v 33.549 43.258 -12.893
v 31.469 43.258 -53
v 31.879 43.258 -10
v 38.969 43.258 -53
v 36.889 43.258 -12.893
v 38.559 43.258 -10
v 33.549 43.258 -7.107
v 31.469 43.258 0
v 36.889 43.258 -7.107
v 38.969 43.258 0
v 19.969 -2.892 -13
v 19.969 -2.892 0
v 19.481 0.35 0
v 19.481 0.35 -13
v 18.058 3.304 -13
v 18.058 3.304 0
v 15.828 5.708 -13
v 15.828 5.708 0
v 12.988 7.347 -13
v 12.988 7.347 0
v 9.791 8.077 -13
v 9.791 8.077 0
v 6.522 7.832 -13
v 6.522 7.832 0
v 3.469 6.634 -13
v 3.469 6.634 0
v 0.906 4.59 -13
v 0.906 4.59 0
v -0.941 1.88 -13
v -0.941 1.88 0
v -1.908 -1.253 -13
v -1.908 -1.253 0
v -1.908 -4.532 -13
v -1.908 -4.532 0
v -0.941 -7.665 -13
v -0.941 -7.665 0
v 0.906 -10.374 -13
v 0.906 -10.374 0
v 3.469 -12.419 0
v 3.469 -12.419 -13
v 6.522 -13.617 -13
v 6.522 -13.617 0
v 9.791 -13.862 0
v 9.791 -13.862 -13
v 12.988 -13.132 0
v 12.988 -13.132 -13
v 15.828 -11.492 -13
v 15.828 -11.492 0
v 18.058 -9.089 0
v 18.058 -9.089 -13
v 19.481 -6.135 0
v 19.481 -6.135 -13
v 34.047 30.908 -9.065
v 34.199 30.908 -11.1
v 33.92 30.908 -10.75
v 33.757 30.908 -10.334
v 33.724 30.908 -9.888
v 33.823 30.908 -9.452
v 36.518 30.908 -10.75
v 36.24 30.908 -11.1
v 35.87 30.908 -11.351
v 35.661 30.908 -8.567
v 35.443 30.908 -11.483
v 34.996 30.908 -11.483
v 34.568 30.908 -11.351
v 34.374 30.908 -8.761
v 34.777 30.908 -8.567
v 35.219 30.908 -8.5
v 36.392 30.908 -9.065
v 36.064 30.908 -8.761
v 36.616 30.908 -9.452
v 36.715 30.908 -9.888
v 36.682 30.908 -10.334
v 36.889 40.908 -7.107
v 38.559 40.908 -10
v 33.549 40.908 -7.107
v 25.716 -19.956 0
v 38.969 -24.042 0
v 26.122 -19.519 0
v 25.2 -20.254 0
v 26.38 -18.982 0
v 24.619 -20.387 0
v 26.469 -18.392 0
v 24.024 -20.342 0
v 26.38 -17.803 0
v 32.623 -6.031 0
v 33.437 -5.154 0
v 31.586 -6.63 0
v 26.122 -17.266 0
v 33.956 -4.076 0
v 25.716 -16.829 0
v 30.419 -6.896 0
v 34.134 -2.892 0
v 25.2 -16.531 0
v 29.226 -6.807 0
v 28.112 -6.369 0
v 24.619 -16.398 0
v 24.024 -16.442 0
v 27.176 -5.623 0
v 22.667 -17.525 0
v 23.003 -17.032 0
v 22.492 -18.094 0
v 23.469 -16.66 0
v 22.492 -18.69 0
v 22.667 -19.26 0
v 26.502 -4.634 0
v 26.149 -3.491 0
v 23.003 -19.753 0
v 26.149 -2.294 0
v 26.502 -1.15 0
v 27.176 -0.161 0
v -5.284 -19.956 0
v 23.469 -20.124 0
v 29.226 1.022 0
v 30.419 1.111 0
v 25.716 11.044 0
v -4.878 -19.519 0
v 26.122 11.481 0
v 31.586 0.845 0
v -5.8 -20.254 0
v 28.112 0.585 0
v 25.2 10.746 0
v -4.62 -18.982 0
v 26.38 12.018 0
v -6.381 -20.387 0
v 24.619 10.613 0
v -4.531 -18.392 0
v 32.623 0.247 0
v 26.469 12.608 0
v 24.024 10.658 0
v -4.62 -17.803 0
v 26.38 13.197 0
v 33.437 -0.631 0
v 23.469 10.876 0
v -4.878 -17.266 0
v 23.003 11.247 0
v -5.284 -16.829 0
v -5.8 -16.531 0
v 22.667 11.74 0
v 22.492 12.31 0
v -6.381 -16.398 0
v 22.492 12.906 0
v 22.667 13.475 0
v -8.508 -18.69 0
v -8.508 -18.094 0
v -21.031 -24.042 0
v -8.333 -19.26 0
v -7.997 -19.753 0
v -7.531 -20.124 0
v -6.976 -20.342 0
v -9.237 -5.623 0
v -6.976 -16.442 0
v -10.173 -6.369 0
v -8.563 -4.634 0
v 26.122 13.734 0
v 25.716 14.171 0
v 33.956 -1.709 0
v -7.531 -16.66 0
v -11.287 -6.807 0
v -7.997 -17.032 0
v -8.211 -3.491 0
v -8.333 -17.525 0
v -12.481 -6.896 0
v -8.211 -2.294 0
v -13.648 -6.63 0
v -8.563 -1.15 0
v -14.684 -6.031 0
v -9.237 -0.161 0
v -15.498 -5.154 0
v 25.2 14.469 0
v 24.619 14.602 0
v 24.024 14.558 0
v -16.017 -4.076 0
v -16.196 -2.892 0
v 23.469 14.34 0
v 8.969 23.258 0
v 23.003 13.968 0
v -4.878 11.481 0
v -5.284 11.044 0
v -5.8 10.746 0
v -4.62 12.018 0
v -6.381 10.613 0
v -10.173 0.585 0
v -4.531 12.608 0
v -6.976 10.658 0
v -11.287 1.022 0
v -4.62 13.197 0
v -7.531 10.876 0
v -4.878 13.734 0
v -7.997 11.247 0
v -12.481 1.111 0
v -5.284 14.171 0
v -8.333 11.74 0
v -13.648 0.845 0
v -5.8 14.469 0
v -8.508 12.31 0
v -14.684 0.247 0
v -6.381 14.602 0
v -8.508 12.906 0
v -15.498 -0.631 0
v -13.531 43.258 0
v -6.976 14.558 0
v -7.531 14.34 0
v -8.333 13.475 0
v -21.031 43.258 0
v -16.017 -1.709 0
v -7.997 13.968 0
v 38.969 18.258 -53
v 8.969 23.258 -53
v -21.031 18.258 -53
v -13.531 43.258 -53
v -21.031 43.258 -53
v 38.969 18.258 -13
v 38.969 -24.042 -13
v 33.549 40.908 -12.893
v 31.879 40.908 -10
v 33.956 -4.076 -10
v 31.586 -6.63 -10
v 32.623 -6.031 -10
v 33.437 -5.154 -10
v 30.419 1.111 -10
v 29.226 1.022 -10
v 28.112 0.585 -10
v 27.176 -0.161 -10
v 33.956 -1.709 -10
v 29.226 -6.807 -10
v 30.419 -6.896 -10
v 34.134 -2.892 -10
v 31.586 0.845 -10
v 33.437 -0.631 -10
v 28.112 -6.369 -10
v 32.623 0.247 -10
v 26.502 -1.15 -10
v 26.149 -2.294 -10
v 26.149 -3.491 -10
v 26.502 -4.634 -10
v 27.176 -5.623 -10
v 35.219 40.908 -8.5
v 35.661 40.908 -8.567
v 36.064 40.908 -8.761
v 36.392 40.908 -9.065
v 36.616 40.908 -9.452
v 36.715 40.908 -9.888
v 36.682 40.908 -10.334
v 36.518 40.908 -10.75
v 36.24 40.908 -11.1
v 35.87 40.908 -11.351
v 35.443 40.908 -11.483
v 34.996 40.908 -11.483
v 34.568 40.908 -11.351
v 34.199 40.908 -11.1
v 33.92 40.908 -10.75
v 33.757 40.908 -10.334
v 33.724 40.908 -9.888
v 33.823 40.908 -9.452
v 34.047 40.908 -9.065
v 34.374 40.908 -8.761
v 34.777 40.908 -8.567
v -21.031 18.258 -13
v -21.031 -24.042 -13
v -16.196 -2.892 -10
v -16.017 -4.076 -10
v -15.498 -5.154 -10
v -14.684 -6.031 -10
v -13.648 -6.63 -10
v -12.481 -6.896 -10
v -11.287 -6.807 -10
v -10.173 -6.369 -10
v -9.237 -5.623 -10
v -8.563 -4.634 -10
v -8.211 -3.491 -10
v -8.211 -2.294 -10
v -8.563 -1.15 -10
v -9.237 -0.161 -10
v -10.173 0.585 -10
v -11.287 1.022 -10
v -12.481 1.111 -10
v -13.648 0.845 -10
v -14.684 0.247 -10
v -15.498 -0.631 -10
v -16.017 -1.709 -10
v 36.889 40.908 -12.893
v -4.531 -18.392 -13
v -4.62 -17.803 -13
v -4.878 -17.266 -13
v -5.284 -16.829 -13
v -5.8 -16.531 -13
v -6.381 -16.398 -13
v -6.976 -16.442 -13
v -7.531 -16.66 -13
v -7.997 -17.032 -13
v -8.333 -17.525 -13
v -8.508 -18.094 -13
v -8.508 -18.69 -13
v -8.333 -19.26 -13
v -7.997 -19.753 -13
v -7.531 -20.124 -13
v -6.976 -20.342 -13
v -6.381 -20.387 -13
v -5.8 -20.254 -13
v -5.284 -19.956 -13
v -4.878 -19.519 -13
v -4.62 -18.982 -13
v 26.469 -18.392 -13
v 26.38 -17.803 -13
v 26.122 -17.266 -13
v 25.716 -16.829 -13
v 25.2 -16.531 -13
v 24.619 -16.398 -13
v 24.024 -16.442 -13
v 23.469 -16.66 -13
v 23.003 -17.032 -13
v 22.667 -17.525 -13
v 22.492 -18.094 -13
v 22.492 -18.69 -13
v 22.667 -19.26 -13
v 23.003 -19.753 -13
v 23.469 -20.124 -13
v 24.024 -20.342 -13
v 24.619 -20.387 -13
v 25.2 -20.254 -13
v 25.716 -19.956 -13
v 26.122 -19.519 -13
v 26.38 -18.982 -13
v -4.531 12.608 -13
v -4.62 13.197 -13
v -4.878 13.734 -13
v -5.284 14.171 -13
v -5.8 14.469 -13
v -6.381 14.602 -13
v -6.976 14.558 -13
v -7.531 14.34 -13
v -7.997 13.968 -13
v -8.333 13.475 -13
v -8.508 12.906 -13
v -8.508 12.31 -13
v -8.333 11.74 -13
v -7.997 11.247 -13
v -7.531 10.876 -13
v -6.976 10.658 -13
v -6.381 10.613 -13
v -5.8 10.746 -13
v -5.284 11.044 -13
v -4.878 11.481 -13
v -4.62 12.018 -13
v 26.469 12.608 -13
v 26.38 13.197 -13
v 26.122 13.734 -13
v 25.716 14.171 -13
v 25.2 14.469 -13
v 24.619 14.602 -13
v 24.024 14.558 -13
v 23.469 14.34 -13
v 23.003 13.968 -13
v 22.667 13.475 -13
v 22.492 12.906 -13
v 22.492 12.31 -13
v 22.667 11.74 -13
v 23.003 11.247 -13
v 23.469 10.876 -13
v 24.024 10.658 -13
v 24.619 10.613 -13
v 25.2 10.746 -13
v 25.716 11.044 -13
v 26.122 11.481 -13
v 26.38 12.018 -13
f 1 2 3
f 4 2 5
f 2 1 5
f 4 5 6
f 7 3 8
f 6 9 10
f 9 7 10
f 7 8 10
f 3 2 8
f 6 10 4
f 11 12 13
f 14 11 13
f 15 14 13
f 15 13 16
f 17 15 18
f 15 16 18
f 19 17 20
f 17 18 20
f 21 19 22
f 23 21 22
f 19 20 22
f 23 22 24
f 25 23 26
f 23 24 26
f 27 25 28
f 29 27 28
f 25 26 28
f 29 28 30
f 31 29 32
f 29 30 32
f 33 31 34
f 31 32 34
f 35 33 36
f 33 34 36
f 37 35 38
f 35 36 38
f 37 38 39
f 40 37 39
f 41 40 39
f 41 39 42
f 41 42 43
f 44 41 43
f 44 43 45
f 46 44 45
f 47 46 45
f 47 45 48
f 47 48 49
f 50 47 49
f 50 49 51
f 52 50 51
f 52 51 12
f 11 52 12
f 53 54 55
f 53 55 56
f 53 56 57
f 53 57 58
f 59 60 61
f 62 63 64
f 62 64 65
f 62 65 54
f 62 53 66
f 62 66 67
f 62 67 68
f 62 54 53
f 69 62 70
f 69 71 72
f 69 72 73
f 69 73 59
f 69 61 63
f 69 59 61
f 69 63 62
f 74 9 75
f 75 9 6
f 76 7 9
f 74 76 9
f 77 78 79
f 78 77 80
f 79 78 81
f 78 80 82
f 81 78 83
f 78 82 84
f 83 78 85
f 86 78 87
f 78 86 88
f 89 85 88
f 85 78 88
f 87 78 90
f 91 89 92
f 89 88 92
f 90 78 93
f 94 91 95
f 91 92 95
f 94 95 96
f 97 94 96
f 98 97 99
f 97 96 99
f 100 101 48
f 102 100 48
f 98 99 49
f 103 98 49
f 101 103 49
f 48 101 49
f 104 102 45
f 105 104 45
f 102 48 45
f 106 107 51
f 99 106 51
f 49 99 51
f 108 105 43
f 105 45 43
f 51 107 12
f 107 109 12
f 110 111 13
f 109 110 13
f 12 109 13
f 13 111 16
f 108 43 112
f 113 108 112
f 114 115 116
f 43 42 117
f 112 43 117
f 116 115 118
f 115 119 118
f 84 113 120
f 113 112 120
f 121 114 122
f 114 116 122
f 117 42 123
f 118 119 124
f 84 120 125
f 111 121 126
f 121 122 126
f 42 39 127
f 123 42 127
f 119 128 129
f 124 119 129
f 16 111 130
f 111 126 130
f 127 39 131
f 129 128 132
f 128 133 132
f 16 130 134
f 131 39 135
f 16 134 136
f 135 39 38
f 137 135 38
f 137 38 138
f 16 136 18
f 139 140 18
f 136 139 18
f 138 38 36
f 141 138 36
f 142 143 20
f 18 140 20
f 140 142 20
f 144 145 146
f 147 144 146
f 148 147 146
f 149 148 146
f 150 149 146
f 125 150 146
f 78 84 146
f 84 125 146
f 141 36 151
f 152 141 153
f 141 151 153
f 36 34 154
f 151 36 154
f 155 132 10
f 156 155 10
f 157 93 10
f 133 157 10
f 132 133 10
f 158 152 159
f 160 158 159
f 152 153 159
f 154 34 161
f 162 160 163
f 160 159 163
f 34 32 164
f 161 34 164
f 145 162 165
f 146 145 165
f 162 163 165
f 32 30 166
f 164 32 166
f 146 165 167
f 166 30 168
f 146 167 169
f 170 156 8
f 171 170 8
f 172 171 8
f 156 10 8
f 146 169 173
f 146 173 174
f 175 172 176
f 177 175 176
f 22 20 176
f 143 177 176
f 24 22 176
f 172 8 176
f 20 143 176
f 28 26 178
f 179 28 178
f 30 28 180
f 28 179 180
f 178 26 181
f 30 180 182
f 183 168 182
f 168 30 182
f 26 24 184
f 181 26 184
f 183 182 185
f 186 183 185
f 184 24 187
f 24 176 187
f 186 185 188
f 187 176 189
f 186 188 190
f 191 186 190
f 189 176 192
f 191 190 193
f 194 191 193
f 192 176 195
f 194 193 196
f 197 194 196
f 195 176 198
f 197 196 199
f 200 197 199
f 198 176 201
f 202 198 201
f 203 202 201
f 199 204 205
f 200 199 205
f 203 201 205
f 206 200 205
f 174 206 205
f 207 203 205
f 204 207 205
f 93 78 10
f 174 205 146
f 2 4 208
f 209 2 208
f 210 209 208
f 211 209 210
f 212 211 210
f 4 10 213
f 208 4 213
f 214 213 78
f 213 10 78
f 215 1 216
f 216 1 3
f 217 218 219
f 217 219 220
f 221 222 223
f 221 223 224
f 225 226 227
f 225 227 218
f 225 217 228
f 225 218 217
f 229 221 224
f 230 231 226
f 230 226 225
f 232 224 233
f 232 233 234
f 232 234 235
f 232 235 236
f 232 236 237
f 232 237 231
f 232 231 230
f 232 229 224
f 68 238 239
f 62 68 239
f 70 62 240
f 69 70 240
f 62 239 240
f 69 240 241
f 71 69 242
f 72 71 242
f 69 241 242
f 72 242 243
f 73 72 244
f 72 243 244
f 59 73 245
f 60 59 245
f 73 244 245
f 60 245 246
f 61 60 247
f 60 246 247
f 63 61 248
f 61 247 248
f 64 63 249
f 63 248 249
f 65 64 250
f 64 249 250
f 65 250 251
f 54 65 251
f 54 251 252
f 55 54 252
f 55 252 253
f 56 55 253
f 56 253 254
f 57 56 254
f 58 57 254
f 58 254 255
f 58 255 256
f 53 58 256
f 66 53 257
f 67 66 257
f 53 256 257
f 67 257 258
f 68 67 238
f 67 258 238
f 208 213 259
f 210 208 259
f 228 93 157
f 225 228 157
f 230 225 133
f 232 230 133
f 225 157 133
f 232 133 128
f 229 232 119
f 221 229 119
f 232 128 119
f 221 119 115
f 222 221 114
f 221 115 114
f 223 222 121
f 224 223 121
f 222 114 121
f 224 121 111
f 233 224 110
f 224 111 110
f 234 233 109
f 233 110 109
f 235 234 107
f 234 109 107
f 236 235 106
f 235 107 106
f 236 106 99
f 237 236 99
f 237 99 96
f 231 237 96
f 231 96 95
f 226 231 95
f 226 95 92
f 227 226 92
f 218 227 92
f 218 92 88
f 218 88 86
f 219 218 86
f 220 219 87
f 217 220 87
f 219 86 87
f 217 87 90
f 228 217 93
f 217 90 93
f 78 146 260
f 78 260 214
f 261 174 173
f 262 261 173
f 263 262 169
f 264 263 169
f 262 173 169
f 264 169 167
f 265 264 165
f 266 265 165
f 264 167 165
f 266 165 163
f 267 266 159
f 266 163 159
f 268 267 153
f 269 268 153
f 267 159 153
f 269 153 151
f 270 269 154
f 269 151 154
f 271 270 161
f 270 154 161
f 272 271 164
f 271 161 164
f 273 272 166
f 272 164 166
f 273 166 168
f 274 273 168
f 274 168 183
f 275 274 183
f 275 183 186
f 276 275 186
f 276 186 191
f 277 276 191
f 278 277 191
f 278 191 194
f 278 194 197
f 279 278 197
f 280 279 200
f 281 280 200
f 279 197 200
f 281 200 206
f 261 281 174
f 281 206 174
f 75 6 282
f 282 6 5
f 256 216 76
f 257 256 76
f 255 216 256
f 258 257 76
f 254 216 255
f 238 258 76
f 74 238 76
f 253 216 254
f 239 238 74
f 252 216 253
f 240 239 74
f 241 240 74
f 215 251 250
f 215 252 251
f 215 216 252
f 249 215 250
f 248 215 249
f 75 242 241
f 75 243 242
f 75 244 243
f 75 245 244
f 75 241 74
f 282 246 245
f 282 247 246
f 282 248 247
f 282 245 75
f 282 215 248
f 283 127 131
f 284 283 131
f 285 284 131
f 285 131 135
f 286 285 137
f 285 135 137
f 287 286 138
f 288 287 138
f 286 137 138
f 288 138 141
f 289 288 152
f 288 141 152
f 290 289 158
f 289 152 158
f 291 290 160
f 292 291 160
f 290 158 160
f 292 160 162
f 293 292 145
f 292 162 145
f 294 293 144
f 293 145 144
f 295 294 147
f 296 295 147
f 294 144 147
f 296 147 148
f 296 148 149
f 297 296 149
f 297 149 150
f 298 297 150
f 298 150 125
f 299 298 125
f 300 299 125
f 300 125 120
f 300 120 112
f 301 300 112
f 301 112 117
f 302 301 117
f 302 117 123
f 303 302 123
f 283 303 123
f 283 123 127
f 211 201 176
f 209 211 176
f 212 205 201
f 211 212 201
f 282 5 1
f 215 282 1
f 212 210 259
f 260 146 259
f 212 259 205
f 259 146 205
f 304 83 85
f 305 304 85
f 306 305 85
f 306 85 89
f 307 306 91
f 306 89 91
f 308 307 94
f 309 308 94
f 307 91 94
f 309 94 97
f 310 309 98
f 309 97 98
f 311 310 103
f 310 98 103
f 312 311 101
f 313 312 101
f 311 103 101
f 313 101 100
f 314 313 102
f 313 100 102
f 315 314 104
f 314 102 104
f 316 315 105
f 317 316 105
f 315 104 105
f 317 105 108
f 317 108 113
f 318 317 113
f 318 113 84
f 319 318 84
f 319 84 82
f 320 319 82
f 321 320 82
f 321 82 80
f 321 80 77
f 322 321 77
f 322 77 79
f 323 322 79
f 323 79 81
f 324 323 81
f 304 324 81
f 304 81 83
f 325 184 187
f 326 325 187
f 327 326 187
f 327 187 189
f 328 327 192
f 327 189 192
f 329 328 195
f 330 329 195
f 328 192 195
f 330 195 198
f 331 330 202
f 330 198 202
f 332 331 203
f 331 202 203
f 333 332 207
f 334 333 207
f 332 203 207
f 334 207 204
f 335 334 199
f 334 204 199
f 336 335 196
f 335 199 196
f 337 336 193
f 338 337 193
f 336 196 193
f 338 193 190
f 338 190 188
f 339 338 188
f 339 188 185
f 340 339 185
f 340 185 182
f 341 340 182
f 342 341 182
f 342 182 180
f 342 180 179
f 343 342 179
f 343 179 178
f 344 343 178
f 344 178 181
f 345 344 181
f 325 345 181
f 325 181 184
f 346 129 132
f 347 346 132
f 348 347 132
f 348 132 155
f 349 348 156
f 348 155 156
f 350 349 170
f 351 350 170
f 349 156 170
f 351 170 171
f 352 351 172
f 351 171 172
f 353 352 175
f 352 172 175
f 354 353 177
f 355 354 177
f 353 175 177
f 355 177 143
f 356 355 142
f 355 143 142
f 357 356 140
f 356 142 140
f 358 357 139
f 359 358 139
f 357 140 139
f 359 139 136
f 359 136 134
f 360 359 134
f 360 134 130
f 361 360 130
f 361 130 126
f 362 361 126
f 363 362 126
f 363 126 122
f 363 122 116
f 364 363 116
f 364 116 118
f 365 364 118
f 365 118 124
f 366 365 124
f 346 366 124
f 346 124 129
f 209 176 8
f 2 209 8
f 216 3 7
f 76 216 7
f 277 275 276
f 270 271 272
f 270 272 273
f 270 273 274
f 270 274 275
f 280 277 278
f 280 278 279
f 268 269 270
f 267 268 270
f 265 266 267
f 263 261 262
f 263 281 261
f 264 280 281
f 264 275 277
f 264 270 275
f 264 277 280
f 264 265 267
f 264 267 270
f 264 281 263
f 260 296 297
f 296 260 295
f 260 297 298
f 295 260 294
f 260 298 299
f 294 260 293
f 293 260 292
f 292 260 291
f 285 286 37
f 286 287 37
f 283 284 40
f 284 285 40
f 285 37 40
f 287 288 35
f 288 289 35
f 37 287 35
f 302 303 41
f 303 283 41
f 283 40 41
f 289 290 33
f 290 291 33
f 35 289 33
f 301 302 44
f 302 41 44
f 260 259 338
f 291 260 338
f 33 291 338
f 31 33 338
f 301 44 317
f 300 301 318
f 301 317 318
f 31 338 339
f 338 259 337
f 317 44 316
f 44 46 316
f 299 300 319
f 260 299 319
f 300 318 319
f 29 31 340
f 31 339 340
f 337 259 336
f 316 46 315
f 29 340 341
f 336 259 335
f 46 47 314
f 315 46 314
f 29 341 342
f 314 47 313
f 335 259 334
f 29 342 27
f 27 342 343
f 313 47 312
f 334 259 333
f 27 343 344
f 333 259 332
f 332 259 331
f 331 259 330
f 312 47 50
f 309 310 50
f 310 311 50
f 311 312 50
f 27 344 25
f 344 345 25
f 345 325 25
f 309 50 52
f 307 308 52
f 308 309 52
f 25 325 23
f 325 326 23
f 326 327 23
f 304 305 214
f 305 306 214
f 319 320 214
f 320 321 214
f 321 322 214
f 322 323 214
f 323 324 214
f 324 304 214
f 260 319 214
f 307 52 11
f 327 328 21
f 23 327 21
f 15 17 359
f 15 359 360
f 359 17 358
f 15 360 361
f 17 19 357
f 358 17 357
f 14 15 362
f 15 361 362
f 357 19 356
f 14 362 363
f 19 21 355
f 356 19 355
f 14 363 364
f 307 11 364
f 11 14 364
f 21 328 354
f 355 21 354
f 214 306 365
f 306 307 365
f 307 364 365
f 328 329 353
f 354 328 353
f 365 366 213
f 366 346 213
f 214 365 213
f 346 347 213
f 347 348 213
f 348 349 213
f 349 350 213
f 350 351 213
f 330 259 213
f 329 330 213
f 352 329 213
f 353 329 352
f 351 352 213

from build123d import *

# Parameters (mm, degrees)
SKETCH2_W           = 60
SKETCH2_H           = 42.3
BOSS_EXTRUDE1_DEPTH = 13
SKETCH4_R           = 11
SKETCH4_R_2         = 2
CUT_EXTRUDE1_DEPTH  = 48.598760453
SKETCH5_R           = 4.015
CUT_EXTRUDE2_DEPTH  = 10
BOSS_EXTRUDE2_DEPTH = 53
CUT_EXTRUDE3_DEPTH  = 2.35
SKETCH8_R           = 1.5
CUT_EXTRUDE4_DEPTH  = 10


with BuildPart() as part:
    # Sketch2 → Boss-Extrude1 (new body)
    with BuildSketch(Plane.XY):
        with Locations((8.969325153, -2.892331288)):
            Rectangle(SKETCH2_W, SKETCH2_H)
    extrude(amount=-BOSS_EXTRUDE1_DEPTH)

    # Sketch4 → Cut-Extrude1 (cut, through all)
    with BuildSketch(Plane.XY):
        with Locations((8.969325153, -2.892331288)):
            Circle(SKETCH4_R)
        with Locations((24.469325153, 12.607668712)):
            Circle(SKETCH4_R_2)
        with Locations((-6.530674847, 12.607668712)):
            Circle(SKETCH4_R_2)
        with Locations((24.469325153, -18.392331288)):
            Circle(SKETCH4_R_2)
        with Locations((-6.530674847, -18.392331288)):
            Circle(SKETCH4_R_2)
    extrude(amount=-CUT_EXTRUDE1_DEPTH, mode=Mode.SUBTRACT)

    # Sketch5 → Cut-Extrude2 (cut)
    with BuildSketch(Plane.XY):
        with Locations((30.119325153, -2.892331288)):
            Circle(SKETCH5_R)
        with Locations(Location((-12.180674847, -2.892331288, 0), (0, 0, 180))):
            Circle(SKETCH5_R)
    extrude(amount=-CUT_EXTRUDE2_DEPTH, mode=Mode.SUBTRACT)

    # Sketch6 → Boss-Extrude2 (add)
    with BuildSketch(Plane.XY):
        Polygon((-21.030674847, 18.257668712), (-21.030674847, 43.257668712), (-13.530674847, 43.257668712), (8.969325153, 23.257668712), (31.469325153, 43.257668712), (38.969325153, 43.257668712), (38.969325153, 18.257668712), align=None)
    extrude(amount=-BOSS_EXTRUDE2_DEPTH)

    # Sketch7 → Cut-Extrude3 (cut)
    with BuildSketch(Plane(origin=(0, 43.257668712, 0), x_dir=(1, 0, 0), z_dir=(0, 1, 0))):
        Polygon((38.559325153, 10), (36.889325153, 12.892524849), (33.549325153, 12.892524849), (31.879325153, 10), (33.549325153, 7.107475151), (36.889325153, 7.107475151), align=None)
    extrude(amount=-CUT_EXTRUDE3_DEPTH, mode=Mode.SUBTRACT)

    # Sketch8 → Cut-Extrude4 (cut)
    with BuildSketch(Plane(origin=(0, 40.907668712, 0), x_dir=(1, 0, 0), z_dir=(0, 1, 0))):
        with Locations(Location((35.219325153, 10, 0), (0, 0, 270))):
            Circle(SKETCH8_R)
    extrude(amount=-CUT_EXTRUDE4_DEPTH, mode=Mode.SUBTRACT)


solid = part.part
